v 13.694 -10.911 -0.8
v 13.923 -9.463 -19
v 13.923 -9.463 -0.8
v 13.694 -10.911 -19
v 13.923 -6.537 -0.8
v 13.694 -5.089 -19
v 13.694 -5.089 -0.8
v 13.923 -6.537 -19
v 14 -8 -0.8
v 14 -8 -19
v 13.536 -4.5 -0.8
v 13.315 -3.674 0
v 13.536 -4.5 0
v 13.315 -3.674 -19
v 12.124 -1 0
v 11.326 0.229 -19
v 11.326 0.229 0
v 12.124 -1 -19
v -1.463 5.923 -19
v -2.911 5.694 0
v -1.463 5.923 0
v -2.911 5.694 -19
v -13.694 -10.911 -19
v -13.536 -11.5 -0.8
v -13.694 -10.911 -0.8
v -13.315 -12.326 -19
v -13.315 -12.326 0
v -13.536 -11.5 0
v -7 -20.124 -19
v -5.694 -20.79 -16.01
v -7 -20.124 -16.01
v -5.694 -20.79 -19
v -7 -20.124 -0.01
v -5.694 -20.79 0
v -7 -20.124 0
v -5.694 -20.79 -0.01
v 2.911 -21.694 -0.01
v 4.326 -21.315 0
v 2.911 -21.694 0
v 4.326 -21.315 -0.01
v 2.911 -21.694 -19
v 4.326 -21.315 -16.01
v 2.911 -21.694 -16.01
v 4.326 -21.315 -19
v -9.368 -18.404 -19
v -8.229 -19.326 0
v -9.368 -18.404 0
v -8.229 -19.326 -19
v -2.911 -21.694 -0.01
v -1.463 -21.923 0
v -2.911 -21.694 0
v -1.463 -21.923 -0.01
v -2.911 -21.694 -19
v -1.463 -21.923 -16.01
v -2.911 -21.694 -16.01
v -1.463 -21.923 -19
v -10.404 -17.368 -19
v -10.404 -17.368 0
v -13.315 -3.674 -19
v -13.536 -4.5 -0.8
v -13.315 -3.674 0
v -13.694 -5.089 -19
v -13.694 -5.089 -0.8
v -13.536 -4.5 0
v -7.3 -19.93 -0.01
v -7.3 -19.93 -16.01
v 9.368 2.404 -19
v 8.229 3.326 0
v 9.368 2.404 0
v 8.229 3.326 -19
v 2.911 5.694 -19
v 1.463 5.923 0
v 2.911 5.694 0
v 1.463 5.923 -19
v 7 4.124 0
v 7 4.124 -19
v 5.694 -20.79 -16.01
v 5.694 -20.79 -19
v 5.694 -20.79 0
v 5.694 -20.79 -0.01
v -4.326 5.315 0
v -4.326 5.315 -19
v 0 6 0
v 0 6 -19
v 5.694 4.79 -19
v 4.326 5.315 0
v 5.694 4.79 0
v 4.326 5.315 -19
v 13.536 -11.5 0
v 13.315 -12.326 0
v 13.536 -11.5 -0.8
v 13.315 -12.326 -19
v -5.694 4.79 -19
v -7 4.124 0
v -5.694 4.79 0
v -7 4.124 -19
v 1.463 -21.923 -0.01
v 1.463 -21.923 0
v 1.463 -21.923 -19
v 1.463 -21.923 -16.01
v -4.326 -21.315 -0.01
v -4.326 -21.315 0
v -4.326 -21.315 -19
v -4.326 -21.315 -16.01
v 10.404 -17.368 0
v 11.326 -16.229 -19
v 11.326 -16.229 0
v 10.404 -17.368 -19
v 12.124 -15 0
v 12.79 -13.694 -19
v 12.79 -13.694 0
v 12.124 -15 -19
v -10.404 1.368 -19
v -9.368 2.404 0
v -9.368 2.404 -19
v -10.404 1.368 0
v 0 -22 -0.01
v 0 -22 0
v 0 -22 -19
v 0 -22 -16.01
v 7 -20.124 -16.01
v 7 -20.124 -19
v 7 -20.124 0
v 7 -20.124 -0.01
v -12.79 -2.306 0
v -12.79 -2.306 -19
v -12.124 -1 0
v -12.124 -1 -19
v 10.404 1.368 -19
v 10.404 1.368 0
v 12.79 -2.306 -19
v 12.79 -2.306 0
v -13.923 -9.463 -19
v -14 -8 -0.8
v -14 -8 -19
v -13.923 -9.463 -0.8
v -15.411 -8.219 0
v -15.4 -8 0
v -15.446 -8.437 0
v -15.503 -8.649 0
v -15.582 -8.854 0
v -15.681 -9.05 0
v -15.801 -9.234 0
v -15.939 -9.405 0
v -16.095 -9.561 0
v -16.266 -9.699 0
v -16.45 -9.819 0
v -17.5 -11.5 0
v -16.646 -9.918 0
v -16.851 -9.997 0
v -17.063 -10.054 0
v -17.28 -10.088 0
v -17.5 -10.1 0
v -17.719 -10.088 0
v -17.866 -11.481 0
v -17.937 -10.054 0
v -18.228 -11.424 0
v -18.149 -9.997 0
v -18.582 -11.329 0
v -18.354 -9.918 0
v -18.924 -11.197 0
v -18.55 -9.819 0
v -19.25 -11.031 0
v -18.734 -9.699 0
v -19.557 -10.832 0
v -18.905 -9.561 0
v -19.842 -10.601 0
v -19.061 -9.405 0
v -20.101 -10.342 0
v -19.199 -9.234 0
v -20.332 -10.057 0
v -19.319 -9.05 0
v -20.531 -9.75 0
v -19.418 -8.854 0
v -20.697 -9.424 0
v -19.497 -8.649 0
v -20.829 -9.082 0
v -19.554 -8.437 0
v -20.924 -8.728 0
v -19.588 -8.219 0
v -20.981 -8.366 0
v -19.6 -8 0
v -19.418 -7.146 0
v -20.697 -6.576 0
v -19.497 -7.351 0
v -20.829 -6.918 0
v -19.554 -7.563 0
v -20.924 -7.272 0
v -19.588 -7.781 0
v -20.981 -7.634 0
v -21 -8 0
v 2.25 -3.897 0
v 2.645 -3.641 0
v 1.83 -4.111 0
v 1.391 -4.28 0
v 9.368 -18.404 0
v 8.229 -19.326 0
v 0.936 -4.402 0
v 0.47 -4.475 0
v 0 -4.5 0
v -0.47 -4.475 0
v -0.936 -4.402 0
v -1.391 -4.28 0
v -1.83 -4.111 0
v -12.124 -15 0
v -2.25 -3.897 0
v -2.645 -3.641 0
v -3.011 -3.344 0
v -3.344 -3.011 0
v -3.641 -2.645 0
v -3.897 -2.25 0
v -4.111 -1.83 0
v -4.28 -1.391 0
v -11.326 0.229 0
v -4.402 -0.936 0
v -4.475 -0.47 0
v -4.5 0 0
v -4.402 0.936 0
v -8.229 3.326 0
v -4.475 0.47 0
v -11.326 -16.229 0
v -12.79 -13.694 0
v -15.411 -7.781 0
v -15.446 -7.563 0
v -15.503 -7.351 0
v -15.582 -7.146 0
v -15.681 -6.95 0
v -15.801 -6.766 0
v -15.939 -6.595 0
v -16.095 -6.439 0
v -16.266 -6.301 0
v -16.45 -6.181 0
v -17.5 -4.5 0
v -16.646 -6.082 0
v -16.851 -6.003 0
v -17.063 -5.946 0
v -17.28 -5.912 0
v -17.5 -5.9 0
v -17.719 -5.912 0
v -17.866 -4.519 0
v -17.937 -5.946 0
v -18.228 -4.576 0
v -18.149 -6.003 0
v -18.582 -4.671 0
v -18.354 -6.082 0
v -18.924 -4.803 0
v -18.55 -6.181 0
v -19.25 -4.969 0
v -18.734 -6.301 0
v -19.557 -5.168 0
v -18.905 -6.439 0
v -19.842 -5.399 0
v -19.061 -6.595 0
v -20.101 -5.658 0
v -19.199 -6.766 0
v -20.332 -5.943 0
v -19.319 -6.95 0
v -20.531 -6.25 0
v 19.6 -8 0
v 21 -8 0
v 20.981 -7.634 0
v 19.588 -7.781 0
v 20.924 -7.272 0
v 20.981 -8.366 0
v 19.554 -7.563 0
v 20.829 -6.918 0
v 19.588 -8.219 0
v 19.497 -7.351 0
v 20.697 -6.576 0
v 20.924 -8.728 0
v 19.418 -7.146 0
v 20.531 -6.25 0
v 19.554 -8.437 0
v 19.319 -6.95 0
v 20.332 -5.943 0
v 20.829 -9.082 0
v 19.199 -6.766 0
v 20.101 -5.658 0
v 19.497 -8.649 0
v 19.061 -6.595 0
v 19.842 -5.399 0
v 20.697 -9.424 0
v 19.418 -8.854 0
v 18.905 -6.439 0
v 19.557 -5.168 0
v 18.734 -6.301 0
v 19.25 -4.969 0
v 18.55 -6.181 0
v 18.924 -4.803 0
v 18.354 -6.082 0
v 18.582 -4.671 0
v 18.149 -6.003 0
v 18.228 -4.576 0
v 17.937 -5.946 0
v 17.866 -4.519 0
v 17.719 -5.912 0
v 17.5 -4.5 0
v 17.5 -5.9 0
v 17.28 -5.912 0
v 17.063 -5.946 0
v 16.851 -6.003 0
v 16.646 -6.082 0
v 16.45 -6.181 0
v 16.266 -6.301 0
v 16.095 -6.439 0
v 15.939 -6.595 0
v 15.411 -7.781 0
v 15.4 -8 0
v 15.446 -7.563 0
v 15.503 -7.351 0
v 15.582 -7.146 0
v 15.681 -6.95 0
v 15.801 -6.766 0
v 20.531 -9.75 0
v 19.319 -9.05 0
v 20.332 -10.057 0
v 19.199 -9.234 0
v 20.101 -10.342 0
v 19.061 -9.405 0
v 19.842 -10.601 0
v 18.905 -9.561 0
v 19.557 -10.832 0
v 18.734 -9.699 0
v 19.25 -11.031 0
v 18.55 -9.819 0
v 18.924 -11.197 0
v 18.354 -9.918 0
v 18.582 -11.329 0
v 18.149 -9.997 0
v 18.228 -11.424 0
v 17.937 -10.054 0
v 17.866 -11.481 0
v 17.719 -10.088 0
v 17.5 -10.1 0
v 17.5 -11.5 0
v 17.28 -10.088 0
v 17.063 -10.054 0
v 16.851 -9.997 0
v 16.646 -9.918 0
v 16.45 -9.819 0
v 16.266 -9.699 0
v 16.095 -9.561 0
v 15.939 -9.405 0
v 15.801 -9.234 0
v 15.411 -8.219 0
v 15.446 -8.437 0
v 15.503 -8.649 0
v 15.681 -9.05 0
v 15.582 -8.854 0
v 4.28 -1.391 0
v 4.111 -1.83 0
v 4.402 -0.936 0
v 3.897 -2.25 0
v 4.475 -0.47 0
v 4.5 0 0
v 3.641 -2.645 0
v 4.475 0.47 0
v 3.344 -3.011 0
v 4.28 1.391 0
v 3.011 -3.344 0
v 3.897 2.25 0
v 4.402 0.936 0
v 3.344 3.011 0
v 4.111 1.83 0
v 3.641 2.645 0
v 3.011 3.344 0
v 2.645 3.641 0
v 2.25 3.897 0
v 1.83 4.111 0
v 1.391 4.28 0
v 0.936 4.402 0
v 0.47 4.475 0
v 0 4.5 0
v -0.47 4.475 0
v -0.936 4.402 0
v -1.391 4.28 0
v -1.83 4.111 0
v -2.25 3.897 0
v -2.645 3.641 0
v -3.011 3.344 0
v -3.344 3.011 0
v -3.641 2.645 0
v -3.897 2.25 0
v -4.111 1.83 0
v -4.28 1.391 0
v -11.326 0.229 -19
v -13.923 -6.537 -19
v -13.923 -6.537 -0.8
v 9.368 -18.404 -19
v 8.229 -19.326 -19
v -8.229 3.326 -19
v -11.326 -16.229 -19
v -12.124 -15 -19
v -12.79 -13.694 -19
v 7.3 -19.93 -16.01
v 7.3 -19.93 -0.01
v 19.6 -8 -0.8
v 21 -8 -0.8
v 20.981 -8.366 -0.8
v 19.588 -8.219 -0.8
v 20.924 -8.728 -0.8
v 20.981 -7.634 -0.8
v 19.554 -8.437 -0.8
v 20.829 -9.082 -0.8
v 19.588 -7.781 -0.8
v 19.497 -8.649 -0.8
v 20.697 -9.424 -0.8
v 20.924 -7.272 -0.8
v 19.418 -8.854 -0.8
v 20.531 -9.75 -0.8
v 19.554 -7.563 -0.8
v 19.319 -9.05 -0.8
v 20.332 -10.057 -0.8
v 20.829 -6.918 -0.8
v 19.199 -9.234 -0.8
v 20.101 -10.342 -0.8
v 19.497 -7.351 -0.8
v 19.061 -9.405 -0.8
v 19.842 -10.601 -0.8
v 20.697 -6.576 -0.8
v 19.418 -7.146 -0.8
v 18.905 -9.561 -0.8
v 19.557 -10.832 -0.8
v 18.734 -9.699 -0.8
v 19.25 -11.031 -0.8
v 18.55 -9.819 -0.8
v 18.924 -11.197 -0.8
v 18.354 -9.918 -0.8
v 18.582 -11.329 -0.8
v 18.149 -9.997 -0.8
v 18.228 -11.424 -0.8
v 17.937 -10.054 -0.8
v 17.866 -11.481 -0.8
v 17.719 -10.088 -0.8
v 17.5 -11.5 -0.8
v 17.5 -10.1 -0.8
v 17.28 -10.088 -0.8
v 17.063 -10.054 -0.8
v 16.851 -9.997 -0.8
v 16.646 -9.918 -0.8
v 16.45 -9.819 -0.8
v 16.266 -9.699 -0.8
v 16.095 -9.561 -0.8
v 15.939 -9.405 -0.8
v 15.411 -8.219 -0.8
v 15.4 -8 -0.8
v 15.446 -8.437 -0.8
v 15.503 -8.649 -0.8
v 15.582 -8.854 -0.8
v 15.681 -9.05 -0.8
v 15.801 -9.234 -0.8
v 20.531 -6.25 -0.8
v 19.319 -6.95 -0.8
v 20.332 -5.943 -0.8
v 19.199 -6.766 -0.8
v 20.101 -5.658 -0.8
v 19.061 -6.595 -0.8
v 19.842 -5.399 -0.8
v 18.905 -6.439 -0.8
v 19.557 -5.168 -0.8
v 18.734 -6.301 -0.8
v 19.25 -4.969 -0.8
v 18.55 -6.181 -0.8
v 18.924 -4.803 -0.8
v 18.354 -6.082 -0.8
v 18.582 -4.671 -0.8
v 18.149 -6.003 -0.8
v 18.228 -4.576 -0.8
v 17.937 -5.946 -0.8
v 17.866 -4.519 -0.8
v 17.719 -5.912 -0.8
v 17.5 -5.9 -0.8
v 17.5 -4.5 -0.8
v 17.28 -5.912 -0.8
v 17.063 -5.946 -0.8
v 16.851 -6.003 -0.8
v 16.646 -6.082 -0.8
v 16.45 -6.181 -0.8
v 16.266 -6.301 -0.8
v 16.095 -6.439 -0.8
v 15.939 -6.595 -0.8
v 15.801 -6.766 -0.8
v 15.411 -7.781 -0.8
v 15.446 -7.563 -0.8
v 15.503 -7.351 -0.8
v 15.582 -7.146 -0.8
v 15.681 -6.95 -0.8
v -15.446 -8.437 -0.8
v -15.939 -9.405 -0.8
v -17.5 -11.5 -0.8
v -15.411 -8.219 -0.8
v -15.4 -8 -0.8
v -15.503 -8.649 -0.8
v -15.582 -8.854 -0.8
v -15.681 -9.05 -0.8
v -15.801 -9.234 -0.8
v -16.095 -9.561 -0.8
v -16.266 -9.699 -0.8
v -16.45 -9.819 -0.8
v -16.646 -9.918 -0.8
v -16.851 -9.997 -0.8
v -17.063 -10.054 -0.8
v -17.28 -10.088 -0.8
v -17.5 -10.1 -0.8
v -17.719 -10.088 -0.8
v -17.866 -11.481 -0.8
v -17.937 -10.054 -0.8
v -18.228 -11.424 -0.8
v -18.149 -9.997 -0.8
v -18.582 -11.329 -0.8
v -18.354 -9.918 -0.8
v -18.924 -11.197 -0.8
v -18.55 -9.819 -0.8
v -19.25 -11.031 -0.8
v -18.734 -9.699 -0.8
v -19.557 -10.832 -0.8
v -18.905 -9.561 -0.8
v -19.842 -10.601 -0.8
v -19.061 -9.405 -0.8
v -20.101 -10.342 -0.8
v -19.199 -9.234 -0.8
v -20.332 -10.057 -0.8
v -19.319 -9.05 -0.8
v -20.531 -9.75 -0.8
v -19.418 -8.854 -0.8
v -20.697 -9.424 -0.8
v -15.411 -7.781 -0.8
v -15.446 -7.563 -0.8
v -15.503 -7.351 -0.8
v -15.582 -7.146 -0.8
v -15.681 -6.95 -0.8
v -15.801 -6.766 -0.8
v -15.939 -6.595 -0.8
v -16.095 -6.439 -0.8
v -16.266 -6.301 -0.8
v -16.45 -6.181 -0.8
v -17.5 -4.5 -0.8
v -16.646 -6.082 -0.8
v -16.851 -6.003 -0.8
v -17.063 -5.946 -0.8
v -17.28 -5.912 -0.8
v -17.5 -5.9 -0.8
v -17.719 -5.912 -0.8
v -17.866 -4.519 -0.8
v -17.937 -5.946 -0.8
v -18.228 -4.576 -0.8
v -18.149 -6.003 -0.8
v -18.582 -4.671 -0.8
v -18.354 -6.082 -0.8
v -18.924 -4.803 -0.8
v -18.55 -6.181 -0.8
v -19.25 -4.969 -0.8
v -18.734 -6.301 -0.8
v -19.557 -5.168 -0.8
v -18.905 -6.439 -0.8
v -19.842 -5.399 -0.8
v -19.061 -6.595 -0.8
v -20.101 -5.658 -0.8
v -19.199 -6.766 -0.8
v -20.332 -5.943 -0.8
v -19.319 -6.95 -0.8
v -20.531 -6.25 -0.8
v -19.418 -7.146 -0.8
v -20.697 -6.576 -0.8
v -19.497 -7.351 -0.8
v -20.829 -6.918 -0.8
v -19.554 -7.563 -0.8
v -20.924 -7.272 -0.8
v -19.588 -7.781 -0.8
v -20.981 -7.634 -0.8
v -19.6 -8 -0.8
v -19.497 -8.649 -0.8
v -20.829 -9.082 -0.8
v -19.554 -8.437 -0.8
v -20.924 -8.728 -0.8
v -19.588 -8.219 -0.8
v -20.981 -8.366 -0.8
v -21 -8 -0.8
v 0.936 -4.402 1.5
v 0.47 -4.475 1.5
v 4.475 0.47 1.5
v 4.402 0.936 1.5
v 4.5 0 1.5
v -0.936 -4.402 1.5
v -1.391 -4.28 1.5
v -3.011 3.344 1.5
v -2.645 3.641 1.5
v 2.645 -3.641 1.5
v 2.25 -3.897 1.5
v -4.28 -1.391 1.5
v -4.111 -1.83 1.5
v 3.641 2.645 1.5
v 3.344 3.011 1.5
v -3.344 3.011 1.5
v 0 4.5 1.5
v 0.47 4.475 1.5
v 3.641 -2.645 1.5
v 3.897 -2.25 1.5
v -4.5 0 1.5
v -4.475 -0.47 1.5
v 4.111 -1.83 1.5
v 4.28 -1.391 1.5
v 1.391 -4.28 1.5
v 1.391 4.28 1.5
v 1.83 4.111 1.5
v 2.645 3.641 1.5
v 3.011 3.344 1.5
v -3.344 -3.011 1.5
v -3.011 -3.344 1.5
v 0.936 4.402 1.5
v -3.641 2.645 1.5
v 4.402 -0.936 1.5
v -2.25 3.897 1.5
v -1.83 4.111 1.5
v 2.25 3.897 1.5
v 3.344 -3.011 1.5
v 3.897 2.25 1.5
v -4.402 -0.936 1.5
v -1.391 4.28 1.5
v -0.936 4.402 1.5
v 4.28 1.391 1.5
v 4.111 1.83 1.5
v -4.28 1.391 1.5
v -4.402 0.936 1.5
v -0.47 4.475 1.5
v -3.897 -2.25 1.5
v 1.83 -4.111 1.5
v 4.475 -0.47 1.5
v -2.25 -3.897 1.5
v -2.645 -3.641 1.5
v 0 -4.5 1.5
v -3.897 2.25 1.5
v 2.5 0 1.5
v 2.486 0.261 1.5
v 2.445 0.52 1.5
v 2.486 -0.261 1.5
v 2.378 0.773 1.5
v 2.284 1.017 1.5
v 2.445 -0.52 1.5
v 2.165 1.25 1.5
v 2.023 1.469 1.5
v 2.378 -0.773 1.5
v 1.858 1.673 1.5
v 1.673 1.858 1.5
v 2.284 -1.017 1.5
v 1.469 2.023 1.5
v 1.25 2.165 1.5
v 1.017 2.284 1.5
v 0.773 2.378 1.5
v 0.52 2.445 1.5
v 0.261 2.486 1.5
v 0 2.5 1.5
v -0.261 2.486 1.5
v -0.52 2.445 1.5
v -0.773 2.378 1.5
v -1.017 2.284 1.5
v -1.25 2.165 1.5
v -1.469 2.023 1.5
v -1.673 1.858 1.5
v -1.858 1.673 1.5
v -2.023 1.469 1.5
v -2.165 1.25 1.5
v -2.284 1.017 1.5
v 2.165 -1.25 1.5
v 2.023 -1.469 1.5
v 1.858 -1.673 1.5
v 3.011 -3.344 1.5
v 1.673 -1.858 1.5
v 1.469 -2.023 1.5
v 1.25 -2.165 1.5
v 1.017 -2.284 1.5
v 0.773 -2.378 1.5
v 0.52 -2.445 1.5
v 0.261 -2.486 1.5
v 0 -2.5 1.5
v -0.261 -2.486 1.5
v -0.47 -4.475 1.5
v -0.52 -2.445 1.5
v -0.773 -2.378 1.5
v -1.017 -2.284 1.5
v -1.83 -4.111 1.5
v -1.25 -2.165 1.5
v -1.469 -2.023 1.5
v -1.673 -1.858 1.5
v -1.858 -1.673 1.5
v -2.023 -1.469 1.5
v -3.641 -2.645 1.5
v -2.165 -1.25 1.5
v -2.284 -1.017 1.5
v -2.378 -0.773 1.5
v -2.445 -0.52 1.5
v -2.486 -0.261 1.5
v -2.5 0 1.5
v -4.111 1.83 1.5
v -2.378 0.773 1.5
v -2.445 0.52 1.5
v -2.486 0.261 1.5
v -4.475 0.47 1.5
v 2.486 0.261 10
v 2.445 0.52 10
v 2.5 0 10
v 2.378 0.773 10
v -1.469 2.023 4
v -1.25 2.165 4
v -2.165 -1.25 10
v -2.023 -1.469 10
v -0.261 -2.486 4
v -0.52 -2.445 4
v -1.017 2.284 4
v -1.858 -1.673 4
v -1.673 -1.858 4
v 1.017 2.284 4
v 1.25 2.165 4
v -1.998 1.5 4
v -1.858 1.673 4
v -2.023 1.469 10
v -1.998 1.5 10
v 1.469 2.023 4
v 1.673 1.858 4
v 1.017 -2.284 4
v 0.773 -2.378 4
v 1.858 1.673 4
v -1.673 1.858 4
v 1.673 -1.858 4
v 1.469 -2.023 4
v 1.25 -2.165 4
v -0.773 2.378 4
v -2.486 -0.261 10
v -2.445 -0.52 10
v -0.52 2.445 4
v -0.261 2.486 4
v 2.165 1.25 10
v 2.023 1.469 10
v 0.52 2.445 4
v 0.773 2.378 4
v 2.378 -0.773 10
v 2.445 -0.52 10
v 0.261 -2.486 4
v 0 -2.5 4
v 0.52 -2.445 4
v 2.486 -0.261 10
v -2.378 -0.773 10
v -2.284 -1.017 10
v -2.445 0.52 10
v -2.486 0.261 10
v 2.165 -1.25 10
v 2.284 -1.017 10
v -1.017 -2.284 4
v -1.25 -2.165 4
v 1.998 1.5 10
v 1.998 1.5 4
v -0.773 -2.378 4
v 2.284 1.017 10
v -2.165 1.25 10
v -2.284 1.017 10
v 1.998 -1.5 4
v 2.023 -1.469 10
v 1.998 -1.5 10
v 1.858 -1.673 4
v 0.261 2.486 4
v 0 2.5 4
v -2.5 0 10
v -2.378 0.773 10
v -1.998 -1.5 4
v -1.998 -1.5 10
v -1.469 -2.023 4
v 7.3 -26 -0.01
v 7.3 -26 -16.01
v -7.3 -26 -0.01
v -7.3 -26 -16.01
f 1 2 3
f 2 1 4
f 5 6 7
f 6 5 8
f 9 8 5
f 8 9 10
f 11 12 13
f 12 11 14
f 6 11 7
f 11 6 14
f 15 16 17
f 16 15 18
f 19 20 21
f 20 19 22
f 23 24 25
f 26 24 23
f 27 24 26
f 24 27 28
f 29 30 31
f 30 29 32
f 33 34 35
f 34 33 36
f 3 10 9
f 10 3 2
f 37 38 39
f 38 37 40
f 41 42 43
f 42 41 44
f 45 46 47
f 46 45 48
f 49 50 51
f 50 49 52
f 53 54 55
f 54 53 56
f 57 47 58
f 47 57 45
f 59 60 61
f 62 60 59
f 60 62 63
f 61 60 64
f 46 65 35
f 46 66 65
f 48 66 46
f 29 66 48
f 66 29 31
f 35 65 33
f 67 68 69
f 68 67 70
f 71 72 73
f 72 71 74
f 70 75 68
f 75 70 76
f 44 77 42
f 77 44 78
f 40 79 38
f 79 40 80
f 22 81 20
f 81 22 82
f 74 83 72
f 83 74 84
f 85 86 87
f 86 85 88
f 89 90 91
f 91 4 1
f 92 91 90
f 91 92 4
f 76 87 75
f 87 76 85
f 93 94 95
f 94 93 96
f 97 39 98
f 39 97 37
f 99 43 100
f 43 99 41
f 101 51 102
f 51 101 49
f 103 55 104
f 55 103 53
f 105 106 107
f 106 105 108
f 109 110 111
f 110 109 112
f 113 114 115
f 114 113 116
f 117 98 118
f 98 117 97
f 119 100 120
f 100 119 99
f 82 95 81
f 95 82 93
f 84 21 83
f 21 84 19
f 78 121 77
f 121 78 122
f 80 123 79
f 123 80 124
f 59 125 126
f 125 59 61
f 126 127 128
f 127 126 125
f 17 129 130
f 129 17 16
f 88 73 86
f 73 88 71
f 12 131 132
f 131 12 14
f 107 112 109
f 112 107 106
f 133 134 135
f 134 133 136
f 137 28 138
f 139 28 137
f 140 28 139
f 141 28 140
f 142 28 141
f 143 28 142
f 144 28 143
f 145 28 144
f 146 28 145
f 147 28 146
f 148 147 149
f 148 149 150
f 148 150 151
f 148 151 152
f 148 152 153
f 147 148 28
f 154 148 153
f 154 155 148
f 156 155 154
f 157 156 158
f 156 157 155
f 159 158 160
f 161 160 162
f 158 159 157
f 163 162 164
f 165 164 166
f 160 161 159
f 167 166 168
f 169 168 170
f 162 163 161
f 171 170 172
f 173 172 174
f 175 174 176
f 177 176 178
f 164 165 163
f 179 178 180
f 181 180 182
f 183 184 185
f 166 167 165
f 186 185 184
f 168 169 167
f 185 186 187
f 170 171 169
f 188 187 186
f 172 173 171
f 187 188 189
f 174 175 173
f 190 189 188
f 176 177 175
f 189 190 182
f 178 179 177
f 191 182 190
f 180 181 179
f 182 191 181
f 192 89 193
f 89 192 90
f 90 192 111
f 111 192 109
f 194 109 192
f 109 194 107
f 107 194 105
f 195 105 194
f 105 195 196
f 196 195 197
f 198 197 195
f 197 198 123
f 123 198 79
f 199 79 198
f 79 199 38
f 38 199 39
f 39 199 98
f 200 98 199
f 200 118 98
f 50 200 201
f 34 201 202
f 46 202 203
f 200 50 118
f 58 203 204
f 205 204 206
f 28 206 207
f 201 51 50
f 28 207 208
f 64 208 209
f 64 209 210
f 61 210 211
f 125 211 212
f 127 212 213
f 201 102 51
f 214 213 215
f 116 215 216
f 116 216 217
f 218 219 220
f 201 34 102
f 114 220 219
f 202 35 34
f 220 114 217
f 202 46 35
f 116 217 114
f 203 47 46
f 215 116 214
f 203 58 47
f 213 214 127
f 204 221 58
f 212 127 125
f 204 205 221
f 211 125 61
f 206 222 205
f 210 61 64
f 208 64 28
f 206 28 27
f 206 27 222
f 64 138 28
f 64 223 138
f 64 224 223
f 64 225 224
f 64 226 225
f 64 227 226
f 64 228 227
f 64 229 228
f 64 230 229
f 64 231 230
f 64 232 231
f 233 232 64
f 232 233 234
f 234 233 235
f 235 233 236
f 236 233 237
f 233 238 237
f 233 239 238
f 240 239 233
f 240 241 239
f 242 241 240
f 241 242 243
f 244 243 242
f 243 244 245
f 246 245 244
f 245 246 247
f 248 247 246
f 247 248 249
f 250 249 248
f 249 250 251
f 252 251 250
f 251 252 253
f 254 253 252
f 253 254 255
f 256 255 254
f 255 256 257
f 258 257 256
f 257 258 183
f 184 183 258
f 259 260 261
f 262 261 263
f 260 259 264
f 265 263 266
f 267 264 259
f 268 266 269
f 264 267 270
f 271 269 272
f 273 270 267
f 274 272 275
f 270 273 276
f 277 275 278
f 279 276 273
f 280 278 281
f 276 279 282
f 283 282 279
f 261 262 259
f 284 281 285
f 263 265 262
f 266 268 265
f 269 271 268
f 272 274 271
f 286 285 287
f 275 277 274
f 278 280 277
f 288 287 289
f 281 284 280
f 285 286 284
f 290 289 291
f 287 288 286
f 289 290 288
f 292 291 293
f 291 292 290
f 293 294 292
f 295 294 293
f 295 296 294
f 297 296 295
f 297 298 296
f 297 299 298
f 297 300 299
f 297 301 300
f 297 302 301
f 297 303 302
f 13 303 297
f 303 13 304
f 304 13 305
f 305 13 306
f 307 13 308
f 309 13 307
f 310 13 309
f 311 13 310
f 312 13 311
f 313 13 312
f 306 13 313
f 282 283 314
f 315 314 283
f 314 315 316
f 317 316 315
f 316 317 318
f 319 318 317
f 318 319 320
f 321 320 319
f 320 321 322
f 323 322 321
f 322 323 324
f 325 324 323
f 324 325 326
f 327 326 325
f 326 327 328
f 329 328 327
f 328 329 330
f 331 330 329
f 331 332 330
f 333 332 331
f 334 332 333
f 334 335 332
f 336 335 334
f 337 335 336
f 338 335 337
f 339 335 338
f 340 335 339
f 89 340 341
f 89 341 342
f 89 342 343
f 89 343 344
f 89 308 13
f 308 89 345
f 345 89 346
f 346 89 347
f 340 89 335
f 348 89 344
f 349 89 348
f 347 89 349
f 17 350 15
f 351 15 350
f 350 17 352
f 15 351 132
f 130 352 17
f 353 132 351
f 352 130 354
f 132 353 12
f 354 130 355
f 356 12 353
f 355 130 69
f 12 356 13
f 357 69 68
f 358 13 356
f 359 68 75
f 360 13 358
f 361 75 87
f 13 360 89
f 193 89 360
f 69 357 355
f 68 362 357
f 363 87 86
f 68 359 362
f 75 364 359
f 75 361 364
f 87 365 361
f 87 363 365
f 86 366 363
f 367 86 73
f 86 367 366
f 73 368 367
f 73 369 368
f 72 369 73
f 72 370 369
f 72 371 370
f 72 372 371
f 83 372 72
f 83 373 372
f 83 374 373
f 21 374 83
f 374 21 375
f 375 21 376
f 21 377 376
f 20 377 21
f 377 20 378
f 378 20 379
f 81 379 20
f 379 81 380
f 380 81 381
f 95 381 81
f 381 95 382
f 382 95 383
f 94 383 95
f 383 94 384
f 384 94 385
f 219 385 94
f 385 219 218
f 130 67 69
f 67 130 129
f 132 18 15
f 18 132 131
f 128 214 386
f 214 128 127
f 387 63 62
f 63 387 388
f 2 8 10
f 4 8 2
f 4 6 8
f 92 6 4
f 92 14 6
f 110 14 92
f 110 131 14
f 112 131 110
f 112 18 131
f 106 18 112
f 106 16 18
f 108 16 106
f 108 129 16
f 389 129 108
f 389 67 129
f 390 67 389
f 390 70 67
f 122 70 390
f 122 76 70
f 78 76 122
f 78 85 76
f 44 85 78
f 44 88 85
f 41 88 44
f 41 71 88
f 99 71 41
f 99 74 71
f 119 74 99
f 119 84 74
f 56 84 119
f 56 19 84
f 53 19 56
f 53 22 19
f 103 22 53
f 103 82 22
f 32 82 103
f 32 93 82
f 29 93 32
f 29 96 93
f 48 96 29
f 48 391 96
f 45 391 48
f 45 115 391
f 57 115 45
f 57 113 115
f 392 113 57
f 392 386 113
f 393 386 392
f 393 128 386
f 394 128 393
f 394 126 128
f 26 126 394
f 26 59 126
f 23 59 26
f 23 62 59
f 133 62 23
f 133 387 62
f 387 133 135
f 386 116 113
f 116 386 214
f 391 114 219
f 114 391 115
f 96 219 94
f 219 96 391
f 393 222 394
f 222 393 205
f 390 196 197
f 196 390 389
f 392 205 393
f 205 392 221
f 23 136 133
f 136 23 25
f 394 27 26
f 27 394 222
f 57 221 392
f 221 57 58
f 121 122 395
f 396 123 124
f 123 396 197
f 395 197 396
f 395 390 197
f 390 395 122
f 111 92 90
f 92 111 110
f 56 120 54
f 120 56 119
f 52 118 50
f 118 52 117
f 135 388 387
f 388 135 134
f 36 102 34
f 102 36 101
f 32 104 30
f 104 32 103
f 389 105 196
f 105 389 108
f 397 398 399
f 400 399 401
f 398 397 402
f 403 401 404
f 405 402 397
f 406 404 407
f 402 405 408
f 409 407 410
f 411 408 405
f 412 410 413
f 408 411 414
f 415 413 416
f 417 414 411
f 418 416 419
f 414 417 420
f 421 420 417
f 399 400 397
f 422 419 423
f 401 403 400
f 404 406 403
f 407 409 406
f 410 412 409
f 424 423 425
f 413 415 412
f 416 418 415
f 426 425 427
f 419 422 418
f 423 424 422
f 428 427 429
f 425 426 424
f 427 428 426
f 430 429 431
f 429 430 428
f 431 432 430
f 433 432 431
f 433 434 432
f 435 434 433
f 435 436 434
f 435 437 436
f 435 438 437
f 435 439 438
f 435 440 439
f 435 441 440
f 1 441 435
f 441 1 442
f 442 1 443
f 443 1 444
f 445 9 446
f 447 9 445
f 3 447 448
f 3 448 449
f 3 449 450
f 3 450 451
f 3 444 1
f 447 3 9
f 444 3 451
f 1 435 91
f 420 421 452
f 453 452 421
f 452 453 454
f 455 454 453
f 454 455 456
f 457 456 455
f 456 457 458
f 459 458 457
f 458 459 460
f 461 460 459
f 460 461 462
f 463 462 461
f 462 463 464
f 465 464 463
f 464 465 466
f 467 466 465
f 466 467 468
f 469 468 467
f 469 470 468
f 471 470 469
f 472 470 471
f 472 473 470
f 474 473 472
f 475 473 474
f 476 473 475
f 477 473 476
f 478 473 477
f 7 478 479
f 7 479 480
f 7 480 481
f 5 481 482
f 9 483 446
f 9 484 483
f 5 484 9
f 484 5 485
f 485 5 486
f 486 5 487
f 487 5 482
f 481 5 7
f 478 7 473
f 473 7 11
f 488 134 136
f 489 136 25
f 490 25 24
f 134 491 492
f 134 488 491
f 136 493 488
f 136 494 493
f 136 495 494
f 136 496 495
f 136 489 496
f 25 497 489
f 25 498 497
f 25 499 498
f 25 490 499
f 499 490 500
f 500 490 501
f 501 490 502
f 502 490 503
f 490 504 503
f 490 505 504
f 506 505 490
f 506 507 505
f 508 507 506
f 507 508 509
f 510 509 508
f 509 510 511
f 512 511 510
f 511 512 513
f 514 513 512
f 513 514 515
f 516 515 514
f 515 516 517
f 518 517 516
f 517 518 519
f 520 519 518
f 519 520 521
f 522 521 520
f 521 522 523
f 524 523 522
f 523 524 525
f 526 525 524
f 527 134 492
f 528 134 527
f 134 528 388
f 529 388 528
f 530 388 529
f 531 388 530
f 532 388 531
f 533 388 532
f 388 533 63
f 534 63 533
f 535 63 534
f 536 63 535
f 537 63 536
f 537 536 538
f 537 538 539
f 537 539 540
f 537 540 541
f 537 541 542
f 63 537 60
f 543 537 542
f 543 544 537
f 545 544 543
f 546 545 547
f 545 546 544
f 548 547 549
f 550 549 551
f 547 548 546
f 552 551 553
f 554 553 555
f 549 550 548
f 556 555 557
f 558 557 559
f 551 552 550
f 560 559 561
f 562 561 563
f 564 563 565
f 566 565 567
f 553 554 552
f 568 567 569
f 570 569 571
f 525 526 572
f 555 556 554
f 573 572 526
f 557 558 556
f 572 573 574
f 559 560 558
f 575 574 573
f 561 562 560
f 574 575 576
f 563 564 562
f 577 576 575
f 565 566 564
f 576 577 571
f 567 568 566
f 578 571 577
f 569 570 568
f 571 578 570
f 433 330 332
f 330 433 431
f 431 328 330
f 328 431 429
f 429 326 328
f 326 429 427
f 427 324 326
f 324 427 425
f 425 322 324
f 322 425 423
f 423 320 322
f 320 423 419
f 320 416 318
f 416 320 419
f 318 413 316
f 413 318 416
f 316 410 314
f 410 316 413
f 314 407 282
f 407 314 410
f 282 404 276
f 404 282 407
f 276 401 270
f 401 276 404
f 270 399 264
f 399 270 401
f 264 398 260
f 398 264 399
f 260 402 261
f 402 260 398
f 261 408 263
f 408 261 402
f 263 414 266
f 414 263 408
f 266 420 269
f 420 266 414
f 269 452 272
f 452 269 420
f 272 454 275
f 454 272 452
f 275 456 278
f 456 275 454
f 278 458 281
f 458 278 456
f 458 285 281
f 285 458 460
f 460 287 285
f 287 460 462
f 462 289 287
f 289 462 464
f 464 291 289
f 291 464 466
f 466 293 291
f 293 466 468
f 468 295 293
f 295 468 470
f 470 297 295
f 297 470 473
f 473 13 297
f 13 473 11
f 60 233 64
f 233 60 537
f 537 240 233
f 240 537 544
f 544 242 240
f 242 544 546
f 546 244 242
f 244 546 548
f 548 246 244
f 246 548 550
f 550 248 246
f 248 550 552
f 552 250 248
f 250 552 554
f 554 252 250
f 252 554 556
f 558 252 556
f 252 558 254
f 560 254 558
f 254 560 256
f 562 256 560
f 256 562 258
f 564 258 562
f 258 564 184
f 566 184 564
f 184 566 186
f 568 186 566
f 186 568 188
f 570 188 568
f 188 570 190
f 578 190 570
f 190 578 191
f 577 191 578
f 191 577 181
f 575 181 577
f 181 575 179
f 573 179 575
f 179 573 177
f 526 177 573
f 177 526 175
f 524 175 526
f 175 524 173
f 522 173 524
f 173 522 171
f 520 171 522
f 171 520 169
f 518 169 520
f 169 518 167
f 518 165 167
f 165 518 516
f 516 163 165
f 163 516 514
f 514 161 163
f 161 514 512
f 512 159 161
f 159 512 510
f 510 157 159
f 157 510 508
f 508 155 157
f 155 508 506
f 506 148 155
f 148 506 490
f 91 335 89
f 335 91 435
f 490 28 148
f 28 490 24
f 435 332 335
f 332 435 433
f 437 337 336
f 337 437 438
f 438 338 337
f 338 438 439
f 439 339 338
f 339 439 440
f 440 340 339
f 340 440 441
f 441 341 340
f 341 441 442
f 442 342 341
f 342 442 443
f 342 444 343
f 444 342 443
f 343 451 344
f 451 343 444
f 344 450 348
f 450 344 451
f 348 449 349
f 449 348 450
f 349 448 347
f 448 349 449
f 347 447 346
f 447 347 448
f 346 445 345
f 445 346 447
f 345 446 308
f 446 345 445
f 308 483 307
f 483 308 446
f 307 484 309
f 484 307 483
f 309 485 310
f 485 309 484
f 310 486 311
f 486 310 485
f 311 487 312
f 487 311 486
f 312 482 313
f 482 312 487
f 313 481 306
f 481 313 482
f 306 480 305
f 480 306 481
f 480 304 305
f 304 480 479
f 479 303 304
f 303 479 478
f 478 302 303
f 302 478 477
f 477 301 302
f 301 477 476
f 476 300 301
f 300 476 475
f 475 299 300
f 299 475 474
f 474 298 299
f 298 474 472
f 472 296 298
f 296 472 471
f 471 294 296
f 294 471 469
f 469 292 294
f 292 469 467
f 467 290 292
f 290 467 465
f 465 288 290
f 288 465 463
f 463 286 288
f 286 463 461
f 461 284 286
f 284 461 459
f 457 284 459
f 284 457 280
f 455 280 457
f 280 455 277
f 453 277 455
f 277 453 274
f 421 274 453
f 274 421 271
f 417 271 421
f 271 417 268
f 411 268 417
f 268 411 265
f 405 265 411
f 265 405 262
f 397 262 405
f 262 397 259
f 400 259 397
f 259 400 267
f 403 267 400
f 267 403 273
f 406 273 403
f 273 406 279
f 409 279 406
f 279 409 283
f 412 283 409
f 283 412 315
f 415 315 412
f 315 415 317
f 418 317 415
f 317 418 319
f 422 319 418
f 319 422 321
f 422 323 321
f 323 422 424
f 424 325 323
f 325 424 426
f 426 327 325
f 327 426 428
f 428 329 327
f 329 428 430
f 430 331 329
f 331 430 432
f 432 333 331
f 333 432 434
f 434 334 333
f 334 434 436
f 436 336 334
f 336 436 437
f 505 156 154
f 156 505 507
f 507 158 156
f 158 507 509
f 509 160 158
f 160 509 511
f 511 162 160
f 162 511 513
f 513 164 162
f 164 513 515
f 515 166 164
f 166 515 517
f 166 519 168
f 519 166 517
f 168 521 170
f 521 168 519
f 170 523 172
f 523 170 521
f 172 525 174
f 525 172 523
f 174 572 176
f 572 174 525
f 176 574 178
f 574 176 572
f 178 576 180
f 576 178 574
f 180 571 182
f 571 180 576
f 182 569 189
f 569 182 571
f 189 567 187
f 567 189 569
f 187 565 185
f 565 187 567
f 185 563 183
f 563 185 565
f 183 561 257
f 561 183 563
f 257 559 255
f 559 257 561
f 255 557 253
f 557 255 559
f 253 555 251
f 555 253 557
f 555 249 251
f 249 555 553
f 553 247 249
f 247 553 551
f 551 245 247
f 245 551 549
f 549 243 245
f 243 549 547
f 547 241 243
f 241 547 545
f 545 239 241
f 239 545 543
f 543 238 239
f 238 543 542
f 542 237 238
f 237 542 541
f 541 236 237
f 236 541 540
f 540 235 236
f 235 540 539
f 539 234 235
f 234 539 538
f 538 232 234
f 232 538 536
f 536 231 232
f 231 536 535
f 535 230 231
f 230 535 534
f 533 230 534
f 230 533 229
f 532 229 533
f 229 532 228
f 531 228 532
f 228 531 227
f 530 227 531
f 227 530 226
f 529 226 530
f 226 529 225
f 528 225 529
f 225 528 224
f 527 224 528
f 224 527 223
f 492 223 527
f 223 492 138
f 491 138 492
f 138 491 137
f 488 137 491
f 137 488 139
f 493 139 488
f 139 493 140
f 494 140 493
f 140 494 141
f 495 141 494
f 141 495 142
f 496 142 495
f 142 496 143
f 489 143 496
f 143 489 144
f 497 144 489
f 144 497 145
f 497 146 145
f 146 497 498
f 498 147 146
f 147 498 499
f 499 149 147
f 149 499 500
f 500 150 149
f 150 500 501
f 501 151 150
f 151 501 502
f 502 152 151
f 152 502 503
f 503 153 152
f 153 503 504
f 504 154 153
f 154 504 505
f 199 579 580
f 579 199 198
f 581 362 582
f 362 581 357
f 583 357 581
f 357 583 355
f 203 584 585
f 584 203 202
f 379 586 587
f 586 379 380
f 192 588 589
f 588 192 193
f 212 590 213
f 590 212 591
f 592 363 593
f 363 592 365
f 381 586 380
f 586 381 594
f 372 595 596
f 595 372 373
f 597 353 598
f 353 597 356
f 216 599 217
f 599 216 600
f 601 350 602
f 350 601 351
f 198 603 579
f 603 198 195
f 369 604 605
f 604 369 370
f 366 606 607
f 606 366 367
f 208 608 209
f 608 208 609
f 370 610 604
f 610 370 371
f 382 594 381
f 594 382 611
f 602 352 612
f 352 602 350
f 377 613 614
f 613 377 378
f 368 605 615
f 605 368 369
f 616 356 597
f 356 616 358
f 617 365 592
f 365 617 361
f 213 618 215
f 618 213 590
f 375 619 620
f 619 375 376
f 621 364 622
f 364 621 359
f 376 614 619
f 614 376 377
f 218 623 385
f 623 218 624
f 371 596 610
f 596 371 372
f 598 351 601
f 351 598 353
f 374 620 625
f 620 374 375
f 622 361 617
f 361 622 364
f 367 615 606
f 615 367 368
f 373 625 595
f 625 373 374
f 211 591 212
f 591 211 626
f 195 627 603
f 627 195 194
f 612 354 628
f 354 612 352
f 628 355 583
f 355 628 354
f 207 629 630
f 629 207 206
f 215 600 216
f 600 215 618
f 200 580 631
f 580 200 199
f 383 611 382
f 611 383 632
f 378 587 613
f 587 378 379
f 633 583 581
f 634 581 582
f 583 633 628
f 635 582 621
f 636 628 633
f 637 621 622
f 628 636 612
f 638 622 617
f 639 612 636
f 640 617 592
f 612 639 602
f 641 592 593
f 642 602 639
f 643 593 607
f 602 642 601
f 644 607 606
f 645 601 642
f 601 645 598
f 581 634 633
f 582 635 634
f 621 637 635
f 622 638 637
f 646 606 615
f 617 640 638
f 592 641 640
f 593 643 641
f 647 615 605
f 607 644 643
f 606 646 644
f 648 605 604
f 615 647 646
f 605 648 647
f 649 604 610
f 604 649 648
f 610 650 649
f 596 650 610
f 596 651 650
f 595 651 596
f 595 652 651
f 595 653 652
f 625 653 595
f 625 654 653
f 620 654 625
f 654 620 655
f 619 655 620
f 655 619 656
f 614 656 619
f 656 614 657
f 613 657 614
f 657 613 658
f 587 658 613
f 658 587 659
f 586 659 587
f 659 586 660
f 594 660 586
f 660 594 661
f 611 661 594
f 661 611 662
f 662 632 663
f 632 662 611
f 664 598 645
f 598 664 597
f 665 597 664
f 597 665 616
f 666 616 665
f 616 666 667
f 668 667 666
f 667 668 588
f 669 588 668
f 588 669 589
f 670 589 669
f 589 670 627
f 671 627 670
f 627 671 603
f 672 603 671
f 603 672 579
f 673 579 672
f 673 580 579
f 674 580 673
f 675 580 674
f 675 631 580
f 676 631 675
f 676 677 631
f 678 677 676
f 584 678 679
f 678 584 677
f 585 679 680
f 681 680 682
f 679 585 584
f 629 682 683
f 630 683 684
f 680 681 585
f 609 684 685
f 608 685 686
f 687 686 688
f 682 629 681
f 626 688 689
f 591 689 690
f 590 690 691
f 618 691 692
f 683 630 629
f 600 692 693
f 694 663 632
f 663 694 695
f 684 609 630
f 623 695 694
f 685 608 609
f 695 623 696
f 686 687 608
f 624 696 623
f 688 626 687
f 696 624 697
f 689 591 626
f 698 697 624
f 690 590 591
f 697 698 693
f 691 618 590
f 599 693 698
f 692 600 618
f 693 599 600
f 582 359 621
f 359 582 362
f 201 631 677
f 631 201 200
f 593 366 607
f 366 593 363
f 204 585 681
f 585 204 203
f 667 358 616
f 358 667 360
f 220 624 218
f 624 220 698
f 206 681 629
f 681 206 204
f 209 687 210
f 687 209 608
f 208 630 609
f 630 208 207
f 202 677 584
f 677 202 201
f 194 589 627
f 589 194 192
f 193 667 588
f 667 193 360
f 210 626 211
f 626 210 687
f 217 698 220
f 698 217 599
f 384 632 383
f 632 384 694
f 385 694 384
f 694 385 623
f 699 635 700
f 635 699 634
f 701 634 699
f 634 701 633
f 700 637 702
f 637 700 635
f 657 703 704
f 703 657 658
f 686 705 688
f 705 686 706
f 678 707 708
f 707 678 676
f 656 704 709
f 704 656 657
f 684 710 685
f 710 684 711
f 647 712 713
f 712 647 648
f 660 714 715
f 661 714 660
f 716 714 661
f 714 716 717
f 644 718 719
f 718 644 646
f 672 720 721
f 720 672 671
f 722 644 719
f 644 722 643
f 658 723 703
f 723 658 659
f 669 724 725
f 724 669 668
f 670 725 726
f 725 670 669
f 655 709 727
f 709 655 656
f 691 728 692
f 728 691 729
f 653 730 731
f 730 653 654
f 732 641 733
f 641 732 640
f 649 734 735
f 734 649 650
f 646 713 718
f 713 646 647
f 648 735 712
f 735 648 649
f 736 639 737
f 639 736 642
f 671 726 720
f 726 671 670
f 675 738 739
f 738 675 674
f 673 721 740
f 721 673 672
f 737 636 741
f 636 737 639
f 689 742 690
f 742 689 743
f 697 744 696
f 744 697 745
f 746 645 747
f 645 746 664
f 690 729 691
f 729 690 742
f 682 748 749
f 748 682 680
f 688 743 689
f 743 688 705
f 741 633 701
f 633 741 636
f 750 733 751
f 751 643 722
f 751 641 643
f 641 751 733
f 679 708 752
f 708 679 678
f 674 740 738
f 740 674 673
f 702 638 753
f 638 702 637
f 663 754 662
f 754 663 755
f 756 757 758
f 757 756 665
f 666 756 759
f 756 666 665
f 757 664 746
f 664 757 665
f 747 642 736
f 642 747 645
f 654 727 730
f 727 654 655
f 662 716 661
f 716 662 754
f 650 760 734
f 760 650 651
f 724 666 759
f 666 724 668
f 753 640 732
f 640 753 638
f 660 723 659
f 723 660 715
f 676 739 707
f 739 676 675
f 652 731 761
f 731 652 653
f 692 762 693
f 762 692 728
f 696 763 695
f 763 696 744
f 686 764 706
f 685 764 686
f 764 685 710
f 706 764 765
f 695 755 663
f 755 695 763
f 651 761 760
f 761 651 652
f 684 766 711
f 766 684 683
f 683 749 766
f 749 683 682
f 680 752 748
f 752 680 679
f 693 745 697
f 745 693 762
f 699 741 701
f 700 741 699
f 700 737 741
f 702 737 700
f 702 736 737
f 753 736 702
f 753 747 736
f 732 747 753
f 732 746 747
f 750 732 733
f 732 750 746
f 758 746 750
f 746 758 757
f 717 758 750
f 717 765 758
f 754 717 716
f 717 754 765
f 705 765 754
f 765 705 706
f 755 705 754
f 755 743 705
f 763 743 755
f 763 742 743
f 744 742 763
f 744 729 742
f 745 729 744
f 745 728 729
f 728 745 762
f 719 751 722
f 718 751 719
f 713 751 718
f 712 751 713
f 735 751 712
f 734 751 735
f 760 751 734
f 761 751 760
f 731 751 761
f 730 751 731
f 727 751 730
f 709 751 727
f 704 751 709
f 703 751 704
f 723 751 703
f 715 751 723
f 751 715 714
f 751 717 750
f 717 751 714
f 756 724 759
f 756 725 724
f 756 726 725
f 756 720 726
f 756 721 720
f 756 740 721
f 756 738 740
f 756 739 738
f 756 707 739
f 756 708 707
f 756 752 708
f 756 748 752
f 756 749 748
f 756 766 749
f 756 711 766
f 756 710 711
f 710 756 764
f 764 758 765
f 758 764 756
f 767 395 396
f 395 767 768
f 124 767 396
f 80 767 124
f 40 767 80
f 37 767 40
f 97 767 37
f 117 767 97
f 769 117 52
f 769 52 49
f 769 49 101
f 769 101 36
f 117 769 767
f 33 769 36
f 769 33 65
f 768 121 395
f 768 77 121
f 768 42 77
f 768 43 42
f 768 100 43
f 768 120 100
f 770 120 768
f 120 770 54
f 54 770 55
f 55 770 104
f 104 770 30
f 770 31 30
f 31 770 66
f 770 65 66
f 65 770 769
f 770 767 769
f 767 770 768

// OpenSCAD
// Basic 28BYJ-48 model based on various dimensioned drawings.
// Origin is centered on the shaft, on the front face of the motor, with the shaft in the +z direction
module Stepper28BYJ48() {
    $fn = 60;

    eps = 0.01;
    chassis_radius = 28/2;
    chassis_height = 19;
    shaft_offset = 8;
    mount_outer_radius = 3.5;
    mount_hole_radius = 4.2/2;
    mount_center_offset = 35/2;
    mount_bracket_height = 0.8;

    shaft_collar_radius = 9/2;
    shaft_collar_height = 1.5;

    shaft_radius = 5/2;
    shaft_height = 10;
    shaft_slotted_width = 3;
    shaft_slotted_height = 6;

    backpack_width = 14.6;
    backpack_extent = 18; // seen values from 17-18
    backpack_height = 16;

    gray = [0.7, 0.7, 0.7];
    gold = "gold";
    blue = "blue";

    module mounting_holes() {
        linear_extrude(height=mount_bracket_height) {
        difference() {
            hull() {
                translate([mount_center_offset, 0]) {
                    circle(r=mount_outer_radius);
                }
                translate([-mount_center_offset, 0]) {
                    circle(r=mount_outer_radius);
                }
            }

            translate([mount_center_offset, 0]) {
                circle(r=mount_hole_radius);
            }
            translate([-mount_center_offset, 0]) {
                circle(r=mount_hole_radius);
            }
        }
        }
    }

    module shaft_collar() {
        cylinder(r=shaft_collar_radius, h=shaft_collar_height + eps);
    }

    module shaft() {
        color(gold) {
            difference() {
                cylinder(r=shaft_radius, h=shaft_height);
                translate([-(shaft_radius + eps), shaft_slotted_width / 2, shaft_height - shaft_slotted_height]) {
                    cube([(shaft_radius+eps)*2, shaft_radius, shaft_slotted_height+eps]);
                }
                translate([-(shaft_radius + eps), - shaft_radius - (shaft_slotted_width / 2), shaft_height - shaft_slotted_height]) {
                    cube([(shaft_radius+eps)*2, shaft_radius, shaft_slotted_height+eps]);
                }
            }
        }
    }

    module chassis() {
        color(gray) {
            translate([0, 0, -chassis_height]) {
                cylinder(r=chassis_radius, h=chassis_height);
            }
            translate([0, 0, -mount_bracket_height]) {
                mounting_holes();
            }
            translate([0, shaft_offset, -eps]) {
                shaft_collar();
            }
        }
    }

    module backpack() {
        color(blue) {
            translate([-backpack_width/2, 0, -backpack_height - eps]) {
                cube([backpack_width, backpack_extent, backpack_height]);
            }
        }
    }

    translate([0, -shaft_offset, 0]) {
        chassis();
        translate([0, shaft_offset, 0]) {
            shaft();
        }
        translate([0, -backpack_extent, 0]) {
            backpack();
        }
    }
}

Stepper28BYJ48();
